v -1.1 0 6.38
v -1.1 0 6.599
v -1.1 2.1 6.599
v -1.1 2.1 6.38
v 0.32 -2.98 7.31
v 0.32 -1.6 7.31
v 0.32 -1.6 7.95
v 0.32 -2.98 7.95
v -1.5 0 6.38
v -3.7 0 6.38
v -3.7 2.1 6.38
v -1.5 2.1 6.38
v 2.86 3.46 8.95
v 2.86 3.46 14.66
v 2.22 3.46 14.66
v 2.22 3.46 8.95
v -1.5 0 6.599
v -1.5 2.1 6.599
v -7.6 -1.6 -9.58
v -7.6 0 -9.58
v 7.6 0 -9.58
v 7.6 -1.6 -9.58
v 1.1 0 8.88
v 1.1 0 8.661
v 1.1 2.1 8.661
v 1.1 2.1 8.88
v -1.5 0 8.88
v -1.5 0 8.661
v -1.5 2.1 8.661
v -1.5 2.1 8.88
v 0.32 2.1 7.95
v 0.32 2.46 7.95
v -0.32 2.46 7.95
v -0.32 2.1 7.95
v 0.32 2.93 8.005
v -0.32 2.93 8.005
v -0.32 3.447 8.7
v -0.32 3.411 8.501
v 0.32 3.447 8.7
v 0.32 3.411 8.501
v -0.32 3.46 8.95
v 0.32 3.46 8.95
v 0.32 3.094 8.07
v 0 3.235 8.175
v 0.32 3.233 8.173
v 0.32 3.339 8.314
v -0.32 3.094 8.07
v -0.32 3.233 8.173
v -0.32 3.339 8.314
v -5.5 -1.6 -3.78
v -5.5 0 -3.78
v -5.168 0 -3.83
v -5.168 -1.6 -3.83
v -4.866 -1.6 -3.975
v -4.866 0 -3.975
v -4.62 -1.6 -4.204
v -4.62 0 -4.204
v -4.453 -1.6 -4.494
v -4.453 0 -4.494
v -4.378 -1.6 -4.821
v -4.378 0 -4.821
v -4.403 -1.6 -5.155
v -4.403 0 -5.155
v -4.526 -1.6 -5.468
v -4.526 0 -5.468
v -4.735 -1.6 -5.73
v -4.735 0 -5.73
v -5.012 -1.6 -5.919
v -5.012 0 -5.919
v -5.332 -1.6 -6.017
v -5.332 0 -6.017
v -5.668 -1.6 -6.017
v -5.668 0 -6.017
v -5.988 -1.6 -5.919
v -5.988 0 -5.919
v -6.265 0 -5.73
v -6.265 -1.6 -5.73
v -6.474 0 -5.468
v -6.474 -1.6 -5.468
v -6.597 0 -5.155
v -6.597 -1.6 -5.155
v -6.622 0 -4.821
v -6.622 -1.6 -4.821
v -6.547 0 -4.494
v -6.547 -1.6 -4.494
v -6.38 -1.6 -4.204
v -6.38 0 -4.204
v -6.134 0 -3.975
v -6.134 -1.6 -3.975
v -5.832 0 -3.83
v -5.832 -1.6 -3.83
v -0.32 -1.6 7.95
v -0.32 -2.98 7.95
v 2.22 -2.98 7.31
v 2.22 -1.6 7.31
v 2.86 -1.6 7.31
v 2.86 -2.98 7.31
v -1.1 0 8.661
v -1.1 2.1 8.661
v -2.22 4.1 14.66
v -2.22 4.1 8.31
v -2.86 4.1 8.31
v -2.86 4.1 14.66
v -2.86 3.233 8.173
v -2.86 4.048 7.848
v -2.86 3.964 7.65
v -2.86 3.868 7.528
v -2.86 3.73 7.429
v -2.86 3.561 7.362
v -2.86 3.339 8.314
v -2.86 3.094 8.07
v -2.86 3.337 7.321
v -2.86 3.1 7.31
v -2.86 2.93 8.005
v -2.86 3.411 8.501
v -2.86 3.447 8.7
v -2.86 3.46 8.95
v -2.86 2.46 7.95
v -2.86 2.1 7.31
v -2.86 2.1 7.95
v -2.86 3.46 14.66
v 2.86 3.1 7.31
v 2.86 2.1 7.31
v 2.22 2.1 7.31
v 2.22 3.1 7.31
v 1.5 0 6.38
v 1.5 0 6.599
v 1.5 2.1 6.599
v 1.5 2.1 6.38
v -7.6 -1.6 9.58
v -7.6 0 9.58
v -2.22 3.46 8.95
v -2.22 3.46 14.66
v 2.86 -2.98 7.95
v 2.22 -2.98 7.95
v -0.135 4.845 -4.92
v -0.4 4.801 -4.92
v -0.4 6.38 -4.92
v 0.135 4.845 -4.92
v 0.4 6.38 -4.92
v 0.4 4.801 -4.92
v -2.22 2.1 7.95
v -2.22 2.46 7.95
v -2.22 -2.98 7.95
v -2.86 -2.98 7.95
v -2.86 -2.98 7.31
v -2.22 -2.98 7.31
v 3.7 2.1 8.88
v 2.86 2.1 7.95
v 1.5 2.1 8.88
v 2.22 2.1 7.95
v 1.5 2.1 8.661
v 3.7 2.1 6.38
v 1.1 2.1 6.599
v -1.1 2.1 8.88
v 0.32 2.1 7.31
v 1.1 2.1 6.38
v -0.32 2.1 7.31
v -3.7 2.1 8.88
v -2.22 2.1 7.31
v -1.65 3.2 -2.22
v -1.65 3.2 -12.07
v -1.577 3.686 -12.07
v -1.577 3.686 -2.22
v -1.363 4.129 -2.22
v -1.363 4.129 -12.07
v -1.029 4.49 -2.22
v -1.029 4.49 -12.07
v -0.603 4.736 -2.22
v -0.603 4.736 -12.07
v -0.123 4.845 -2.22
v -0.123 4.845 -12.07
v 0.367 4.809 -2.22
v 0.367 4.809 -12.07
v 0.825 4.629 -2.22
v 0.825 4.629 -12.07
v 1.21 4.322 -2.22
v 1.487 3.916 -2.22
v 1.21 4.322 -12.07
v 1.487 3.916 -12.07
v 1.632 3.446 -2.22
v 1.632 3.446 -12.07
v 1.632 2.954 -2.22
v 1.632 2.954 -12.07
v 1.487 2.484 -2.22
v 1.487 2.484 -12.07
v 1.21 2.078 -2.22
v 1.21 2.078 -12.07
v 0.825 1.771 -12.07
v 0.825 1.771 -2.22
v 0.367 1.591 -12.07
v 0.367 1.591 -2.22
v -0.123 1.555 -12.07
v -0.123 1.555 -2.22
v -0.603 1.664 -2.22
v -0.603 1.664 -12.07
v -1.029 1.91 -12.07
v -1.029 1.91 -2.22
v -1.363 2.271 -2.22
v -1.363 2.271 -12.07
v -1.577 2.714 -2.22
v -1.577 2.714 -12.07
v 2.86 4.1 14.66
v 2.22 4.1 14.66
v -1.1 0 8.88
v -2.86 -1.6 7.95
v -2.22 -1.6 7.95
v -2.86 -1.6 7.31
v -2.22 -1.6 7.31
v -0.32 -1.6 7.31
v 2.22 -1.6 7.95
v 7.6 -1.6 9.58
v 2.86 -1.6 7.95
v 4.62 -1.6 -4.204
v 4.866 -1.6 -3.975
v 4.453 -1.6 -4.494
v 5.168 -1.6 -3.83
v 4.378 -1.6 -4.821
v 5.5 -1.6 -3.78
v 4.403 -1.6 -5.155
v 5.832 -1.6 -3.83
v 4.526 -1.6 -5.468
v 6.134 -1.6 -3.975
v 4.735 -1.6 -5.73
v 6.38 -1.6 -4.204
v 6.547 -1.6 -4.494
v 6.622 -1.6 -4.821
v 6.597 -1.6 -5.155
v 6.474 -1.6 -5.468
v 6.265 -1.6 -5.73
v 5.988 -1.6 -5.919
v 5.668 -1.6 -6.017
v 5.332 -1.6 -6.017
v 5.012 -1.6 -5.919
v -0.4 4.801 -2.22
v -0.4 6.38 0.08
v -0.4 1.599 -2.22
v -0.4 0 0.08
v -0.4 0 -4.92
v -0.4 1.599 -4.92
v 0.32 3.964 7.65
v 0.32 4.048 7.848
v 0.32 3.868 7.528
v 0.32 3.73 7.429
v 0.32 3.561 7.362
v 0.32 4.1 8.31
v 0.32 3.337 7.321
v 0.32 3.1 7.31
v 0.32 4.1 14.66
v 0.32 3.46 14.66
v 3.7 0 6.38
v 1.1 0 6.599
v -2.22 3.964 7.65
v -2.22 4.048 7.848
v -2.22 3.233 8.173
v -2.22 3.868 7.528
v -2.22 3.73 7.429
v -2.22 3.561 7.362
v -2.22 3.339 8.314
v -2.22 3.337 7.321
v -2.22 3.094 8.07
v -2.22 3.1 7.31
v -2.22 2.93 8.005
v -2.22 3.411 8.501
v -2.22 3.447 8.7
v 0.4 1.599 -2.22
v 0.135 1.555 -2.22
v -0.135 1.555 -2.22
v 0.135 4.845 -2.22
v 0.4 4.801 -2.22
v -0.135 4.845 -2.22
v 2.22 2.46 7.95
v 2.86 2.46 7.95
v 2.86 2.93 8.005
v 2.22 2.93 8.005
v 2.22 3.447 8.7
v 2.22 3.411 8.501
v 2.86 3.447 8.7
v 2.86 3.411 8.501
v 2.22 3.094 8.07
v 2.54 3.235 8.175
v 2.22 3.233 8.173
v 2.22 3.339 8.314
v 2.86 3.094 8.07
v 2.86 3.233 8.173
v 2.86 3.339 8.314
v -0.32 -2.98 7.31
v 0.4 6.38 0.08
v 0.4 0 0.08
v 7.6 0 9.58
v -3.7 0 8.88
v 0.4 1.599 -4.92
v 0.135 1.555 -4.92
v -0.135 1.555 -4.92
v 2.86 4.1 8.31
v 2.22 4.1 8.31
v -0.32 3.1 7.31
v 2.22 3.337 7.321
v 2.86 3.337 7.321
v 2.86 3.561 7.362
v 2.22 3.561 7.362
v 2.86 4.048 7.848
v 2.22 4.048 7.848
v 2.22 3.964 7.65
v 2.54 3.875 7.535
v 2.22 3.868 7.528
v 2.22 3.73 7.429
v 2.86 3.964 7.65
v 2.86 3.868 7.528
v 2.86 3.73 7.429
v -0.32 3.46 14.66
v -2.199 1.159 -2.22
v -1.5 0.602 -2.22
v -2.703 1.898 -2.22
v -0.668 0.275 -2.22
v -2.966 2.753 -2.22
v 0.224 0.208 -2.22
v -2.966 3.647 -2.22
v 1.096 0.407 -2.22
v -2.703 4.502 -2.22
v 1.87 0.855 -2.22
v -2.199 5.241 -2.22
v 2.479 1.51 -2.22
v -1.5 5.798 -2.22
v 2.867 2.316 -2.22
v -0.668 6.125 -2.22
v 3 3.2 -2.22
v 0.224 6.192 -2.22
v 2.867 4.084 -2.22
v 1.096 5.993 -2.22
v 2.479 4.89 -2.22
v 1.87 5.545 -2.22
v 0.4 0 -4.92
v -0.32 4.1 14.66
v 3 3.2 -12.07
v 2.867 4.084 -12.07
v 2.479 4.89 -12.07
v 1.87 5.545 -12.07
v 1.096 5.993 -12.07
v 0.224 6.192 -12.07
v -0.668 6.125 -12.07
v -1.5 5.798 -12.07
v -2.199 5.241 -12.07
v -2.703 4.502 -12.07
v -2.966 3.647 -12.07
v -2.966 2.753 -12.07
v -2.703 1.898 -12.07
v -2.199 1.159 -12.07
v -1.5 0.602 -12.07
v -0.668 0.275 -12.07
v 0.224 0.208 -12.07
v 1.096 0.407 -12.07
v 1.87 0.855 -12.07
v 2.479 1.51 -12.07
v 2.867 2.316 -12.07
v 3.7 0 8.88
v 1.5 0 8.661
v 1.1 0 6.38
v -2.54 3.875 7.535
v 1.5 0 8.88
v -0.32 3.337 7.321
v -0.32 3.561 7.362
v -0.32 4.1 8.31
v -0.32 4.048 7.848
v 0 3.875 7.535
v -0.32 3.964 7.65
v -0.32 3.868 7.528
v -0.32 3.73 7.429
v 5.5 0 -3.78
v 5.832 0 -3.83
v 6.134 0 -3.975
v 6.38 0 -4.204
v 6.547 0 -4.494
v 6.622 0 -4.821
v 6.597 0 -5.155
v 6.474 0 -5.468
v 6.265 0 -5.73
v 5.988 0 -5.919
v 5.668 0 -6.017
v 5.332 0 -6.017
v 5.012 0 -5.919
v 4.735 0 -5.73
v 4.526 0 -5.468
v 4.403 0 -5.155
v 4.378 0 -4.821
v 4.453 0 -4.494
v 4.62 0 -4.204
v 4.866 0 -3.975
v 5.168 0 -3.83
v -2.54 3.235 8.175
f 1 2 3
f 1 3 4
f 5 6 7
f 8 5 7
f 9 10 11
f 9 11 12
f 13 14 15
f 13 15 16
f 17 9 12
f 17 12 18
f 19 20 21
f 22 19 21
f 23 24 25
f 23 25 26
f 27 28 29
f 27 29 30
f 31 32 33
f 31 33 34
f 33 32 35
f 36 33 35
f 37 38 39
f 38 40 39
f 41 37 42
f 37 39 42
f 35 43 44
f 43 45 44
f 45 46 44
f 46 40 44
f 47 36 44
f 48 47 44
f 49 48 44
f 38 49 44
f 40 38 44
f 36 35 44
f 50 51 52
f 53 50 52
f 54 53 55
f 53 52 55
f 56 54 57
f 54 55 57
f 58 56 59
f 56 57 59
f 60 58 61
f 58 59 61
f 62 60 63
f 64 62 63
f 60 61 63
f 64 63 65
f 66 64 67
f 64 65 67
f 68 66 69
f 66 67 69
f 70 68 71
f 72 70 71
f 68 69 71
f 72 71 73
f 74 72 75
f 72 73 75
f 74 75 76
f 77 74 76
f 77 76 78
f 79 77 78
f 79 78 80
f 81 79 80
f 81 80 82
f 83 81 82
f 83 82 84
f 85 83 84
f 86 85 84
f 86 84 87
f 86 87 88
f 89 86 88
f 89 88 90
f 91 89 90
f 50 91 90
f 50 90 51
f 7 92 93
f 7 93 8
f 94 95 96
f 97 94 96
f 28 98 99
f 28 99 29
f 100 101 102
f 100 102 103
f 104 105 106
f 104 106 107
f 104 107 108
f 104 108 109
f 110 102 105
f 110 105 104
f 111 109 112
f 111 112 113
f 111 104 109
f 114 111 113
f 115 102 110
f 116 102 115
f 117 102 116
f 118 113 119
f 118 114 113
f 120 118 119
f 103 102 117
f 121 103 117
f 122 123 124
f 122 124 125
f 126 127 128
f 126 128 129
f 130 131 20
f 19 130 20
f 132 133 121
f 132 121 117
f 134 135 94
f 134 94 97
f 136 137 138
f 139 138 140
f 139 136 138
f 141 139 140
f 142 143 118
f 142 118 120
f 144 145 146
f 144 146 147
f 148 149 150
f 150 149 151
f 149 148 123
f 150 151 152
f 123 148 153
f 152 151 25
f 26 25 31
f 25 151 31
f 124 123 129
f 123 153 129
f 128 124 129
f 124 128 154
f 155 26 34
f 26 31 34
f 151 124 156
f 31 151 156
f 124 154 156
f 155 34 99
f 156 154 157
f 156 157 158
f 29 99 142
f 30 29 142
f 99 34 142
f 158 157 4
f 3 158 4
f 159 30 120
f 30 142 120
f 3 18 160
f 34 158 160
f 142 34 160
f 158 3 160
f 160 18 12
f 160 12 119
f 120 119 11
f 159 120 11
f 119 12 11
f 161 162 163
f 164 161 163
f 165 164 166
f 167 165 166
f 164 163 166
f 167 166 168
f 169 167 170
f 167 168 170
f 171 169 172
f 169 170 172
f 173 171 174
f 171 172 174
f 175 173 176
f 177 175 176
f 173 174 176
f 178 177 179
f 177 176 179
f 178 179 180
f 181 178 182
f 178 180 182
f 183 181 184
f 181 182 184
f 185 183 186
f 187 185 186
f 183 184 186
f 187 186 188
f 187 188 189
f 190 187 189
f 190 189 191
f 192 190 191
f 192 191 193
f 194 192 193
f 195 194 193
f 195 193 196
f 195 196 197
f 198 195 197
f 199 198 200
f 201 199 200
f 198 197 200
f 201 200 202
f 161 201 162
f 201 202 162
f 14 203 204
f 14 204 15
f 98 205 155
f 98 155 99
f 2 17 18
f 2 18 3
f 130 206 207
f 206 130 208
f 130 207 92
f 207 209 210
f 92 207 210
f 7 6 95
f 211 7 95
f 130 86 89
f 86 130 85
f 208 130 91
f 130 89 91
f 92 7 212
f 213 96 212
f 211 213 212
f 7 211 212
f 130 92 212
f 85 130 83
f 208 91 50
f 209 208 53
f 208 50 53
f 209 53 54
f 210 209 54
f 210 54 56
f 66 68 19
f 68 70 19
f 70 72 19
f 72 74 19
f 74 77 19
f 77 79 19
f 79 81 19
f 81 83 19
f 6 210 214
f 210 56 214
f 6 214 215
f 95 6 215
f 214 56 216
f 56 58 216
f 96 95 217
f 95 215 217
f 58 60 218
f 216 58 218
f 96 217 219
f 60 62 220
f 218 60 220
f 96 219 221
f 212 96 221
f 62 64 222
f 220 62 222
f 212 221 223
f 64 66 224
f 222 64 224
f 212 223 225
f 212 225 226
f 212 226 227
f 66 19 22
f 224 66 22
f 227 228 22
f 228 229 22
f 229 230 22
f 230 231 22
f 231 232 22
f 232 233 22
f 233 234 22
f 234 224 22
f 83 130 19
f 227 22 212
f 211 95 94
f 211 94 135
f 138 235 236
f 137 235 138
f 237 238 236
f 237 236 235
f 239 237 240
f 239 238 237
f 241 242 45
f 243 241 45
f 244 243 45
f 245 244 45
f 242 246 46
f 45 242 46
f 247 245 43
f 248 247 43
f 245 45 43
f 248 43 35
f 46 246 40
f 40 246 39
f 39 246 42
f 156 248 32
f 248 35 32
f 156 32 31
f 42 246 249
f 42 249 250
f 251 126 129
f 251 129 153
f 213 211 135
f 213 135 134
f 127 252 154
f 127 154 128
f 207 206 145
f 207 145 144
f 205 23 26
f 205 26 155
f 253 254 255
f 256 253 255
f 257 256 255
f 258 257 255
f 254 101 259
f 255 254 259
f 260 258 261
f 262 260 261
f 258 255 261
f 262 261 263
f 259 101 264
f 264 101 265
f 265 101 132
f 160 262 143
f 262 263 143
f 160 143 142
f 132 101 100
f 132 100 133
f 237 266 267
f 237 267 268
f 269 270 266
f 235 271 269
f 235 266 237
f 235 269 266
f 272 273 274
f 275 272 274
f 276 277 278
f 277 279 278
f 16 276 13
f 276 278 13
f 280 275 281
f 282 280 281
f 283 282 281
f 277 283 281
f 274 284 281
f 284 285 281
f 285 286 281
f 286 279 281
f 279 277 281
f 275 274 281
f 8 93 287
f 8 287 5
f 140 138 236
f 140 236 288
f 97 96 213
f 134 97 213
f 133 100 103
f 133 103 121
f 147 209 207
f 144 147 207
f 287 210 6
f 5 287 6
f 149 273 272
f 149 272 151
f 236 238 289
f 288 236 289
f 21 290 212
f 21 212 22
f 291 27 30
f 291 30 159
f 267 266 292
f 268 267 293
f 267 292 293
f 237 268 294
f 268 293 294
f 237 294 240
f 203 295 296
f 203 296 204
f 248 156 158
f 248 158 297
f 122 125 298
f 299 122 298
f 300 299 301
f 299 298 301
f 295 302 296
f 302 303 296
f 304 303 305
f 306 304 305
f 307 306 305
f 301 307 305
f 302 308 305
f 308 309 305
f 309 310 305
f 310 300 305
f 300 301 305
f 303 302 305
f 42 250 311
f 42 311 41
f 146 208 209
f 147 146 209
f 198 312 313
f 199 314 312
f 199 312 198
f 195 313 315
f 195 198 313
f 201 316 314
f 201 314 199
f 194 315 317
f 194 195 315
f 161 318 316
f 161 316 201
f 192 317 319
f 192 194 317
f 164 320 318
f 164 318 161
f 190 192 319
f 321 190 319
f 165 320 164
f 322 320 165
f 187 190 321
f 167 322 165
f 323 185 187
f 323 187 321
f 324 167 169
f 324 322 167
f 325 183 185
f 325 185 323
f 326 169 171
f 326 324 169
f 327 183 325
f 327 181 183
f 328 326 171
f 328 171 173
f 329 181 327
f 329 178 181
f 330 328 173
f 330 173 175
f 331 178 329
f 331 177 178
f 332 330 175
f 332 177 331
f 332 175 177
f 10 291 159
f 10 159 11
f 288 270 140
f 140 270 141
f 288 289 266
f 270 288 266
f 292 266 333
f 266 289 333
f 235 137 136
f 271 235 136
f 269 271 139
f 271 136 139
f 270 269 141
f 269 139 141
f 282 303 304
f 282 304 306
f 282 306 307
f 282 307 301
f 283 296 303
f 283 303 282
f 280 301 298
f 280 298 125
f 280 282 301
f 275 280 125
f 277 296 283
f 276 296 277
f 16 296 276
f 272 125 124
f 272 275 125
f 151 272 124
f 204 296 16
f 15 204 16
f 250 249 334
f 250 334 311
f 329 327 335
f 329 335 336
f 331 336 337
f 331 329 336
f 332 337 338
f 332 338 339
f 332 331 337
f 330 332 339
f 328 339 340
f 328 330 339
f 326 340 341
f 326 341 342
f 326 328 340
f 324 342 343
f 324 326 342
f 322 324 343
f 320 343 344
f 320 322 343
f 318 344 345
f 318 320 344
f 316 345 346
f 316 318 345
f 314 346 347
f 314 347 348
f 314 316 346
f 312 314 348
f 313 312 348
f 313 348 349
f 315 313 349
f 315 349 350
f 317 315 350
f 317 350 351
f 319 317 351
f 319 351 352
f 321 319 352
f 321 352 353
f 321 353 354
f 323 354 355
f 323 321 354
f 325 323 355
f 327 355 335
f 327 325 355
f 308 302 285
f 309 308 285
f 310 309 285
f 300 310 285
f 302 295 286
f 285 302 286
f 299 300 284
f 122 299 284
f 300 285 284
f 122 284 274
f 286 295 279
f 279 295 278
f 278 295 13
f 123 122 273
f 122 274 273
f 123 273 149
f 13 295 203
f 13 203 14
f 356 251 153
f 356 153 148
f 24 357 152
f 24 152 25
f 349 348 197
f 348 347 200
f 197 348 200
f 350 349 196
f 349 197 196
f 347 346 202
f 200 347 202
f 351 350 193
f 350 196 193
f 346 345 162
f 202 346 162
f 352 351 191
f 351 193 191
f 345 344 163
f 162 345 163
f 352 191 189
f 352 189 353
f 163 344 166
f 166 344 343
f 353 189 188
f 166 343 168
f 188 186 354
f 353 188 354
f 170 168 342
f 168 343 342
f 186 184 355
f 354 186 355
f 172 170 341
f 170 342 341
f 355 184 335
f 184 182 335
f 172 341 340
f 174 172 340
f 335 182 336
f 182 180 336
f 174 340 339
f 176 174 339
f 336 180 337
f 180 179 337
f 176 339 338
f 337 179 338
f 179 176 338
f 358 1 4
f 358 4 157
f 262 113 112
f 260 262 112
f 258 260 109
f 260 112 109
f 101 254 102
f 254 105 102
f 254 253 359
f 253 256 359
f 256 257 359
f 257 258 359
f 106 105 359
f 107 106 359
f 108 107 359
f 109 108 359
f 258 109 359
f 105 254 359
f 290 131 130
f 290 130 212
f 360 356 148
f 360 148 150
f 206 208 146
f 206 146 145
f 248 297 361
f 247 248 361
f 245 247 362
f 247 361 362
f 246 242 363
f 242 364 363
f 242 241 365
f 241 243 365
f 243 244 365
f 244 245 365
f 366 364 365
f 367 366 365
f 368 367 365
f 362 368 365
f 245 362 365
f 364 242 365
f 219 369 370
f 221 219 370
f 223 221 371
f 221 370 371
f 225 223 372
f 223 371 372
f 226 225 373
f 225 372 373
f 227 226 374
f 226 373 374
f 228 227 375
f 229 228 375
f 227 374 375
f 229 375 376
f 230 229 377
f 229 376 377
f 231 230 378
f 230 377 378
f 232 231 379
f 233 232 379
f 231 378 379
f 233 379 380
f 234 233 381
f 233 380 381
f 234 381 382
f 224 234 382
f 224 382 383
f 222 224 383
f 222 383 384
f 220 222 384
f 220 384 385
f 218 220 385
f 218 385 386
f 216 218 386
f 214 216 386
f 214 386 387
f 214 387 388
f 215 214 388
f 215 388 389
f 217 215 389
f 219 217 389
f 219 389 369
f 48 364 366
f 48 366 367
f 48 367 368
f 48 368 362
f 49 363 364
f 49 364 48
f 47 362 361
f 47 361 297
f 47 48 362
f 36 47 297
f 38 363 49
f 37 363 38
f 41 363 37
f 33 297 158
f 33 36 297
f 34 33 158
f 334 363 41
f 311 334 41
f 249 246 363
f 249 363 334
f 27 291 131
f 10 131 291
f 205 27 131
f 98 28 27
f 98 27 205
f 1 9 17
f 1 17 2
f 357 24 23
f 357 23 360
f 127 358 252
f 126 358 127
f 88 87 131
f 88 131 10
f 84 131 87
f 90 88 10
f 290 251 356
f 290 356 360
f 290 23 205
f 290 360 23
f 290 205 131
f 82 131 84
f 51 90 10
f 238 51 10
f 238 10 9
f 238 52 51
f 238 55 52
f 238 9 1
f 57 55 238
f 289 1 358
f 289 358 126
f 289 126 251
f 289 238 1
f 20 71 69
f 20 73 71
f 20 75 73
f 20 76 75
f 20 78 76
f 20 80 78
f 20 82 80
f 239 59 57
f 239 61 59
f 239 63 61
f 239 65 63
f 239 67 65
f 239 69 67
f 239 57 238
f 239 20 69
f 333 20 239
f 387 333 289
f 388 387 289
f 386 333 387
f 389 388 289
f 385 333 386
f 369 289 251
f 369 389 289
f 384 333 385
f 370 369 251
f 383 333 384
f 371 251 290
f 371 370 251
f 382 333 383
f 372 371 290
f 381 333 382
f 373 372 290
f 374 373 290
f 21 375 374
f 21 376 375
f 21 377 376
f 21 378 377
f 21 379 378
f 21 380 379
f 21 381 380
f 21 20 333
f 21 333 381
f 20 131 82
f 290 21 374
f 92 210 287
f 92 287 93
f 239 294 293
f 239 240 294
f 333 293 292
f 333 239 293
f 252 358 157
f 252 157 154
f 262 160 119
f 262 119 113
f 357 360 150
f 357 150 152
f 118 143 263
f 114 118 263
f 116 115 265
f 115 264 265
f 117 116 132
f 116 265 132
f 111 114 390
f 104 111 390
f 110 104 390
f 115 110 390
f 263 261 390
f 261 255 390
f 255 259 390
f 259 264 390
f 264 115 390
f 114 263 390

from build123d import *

# Parameters (mm, degrees)
SKETCH1_W                     = 15.2
SKETCH1_H                     = 19.16
BOSS_EXTRUDE1_DEPTH           = 1.6
SKETCH2_R                     = 1.125
CUT_EXTRUDE1_DEPTH            = 13.332736923
BOSS_EXTRUDE2_DEPTH           = 2.1
BOSS_EXTRUDE3_DEPTH           = 0.32
FILLET1_SIZE                  = 1
LPATTERN1_COUNT               = 2
LPATTERN1_PITCH               = 2.54
FILLET1_OF_LPATTERN1_SIZE     = 1
LPATTERN1_COL_COUNT           = 2
LPATTERN1_COL_PITCH           = 2.54
FILLET1_OF_LPATTERN1_COL_SIZE = 1
SKETCH5_W                     = 0.8
SKETCH5_H                     = 5
BOSS_EXTRUDE4_DEPTH           = 6.38
SKETCH6_R                     = 3
BOSS_EXTRUDE7_DEPTH           = 9.85
SKETCH8_R                     = 1.65
CUT_EXTRUDE2_DEPTH            = 9.85
SKETCH9_W                     = 0.64
SKETCH9_H                     = 0.64
BOSS_EXTRUDE11_DEPTH          = 1.38


with BuildPart() as part:
    # Sketch1 → Boss-Extrude1 (new body)
    with BuildSketch(Plane(origin=(0, 0, 0), x_dir=(1, 0, 0), z_dir=(0, 1, 0))):
        Rectangle(SKETCH1_W, SKETCH1_H)
    extrude(amount=-BOSS_EXTRUDE1_DEPTH)

    # Sketch2 → Cut-Extrude1 (cut, through all)
    with BuildSketch(Plane(origin=(0, 0, 0), x_dir=(1, 0, 0), z_dir=(0, 1, 0))):
        with Locations(Location((-5.5, 4.905, 0), (0, 0, 270))):
            Circle(SKETCH2_R)
        with Locations(Location((5.5, 4.905, 0), (0, 0, 270))):
            Circle(SKETCH2_R)
    extrude(amount=-CUT_EXTRUDE1_DEPTH, mode=Mode.SUBTRACT)

    # Sketch3 → Boss-Extrude2 (add)
    with BuildSketch(Plane(origin=(0, 0, 0), x_dir=(1, 0, 0), z_dir=(0, 1, 0))):
        Polygon((-3.7, -6.38), (-1.5, -6.38), (-1.5, -6.598611303), (-1.1, -6.598611303), (-1.1, -6.38), (1.1, -6.38), (1.1, -6.598611303), (1.5, -6.598611303), (1.5, -6.38), (3.7, -6.38), (3.7, -8.88), (1.5, -8.88), (1.5, -8.661388697), (1.1, -8.661388697), (1.1, -8.88), (-1.1, -8.88), (-1.1, -8.661388697), (-1.5, -8.661388697), (-1.5, -8.88), (-3.7, -8.88), align=None)
    extrude(amount=BOSS_EXTRUDE2_DEPTH)

    # Sketch4 → Boss-Extrude3 (add, symmetric)
    with BuildSketch(Plane(origin=(0, 0, 0), x_dir=(0, 0, -1), z_dir=(1, 0, 0))):
        Polygon((-7.95, 2.1), (-7.31, 2.1), (-7.31, 4.1), (-14.66, 4.1), (-14.66, 3.46), (-7.95, 3.46), align=None)
    boss_extrude3 = extrude(amount=BOSS_EXTRUDE3_DEPTH, both=True)

    # Fillet1
    # a fillet whose section is not a circle: 1 mm, written as the material it adds along each edge
    with BuildSketch(Plane(origin=(0.32, 3.46, 7.95), x_dir=(0, -1, 0), z_dir=(-1, 0, 0))) as fillet1_piece_1:
        with BuildLine():
            Bezier((FILLET1_SIZE, 0), (0, 0), (0, FILLET1_SIZE), weights=[1, 1.222222222, 1])
            Line((0, FILLET1_SIZE), (0, 0))
            Line((0, 0), (FILLET1_SIZE, 0))
        make_face()
    extrude(amount=0.64)
    # a fillet whose section is not a circle: 1 mm, written as the material it takes off along each edge
    with BuildSketch(Plane(origin=(-2.82, 4.1, 7.31), x_dir=(0, -1, 0), z_dir=(1, 0, 0))) as fillet1_2_piece_1:
        with BuildLine():
            Bezier((FILLET1_SIZE, 0), (0, 0), (0, -FILLET1_SIZE), weights=[1, 1.222222222, 1])
            Line((0, -FILLET1_SIZE), (0, 0))
            Line((0, 0), (FILLET1_SIZE, 0))
        make_face()
    extrude(amount=5.64, mode=Mode.SUBTRACT)

    # LPattern1: Boss-Extrude3 ×2
    with Locations(*[(i * LPATTERN1_PITCH, 0, 0) for i in range(1, LPATTERN1_COUNT)]):
        add(boss_extrude3)

    # Fillet1 of LPattern1
    # a fillet whose section is not a circle: 1 mm, written as the material it adds along each edge
    with BuildSketch(Plane(origin=(2.86, 3.46, 7.95), x_dir=(0, -1, 0), z_dir=(-1, 0, 0))) as fillet1_of_lpattern1_piece_1:
        with BuildLine():
            Bezier((FILLET1_OF_LPATTERN1_SIZE, 0), (0, 0), (0, FILLET1_OF_LPATTERN1_SIZE), weights=[1, 1.222222222, 1])
            Line((0, FILLET1_OF_LPATTERN1_SIZE), (0, 0))
            Line((0, 0), (FILLET1_OF_LPATTERN1_SIZE, 0))
        make_face()
    extrude(amount=0.64)
    with BuildSketch(Plane(origin=(2.86, 3.46, 7.95), x_dir=(0, -1, 0), z_dir=(-1, 0, 0))) as fillet1_of_lpattern1_piece_2_section:
        with BuildLine():
            Bezier((FILLET1_OF_LPATTERN1_SIZE, 0), (0, 0), (0, FILLET1_OF_LPATTERN1_SIZE), weights=[1, 1.222222222, 1])
            Line((0, FILLET1_OF_LPATTERN1_SIZE), (0, 0))
            Line((0, 0), (FILLET1_OF_LPATTERN1_SIZE, 0))
        make_face()
    fillet1_of_lpattern1_piece_2 = extrude(amount=3.14, mode=Mode.PRIVATE)
    fillet1_of_lpattern1_piece_2 = split(fillet1_of_lpattern1_piece_2, bisect_by=Plane(origin=(0.32, 3.46, 7.95), z_dir=(-1, 0, 0)), keep=Keep.TOP, mode=Mode.PRIVATE)
    add(fillet1_of_lpattern1_piece_2)
    # a fillet whose section is not a circle: 1 mm, written as the material it takes off along each edge
    with BuildSketch(Plane(origin=(-0.28, 4.1, 7.31), x_dir=(0, -1, 0), z_dir=(1, 0, 0))) as fillet1_of_lpattern1_2_piece_1:
        with BuildLine():
            Bezier((FILLET1_OF_LPATTERN1_SIZE, 0), (0, 0), (0, -FILLET1_OF_LPATTERN1_SIZE), weights=[1, 1.222222222, 1])
            Line((0, -FILLET1_OF_LPATTERN1_SIZE), (0, 0))
            Line((0, 0), (FILLET1_OF_LPATTERN1_SIZE, 0))
        make_face()
    extrude(amount=5.64, mode=Mode.SUBTRACT)

    # LPattern1 col: Boss-Extrude3 ×2
    with Locations(*[(-i * LPATTERN1_COL_PITCH, 0, 0) for i in range(1, LPATTERN1_COL_COUNT)]):
        add(boss_extrude3)

    # Fillet1 of LPattern1 col
    # a fillet whose section is not a circle: 1 mm, written as the material it adds along each edge
    with BuildSketch(Plane(origin=(0.28, 3.46, 7.95), x_dir=(0, -1, 0), z_dir=(-1, 0, 0))) as fillet1_of_lpattern1_col_piece_1_section:
        with BuildLine():
            Bezier((FILLET1_OF_LPATTERN1_COL_SIZE, 0), (0, 0), (0, FILLET1_OF_LPATTERN1_COL_SIZE), weights=[1, 1.222222222, 1])
            Line((0, FILLET1_OF_LPATTERN1_COL_SIZE), (0, 0))
            Line((0, 0), (FILLET1_OF_LPATTERN1_COL_SIZE, 0))
        make_face()
    fillet1_of_lpattern1_col_piece_1 = extrude(amount=3.14, mode=Mode.PRIVATE)
    fillet1_of_lpattern1_col_piece_1 = split(fillet1_of_lpattern1_col_piece_1, bisect_by=Plane(origin=(-0.32, 3.46, 7.95), z_dir=(1, 0, 0)), keep=Keep.TOP, mode=Mode.PRIVATE)
    add(fillet1_of_lpattern1_col_piece_1)
    with BuildSketch(Plane(origin=(-2.22, 3.46, 7.95), x_dir=(0, -1, 0), z_dir=(-1, 0, 0))) as fillet1_of_lpattern1_col_piece_2:
        with BuildLine():
            Bezier((FILLET1_OF_LPATTERN1_COL_SIZE, 0), (0, 0), (0, FILLET1_OF_LPATTERN1_COL_SIZE), weights=[1, 1.222222222, 1])
            Line((0, FILLET1_OF_LPATTERN1_COL_SIZE), (0, 0))
            Line((0, 0), (FILLET1_OF_LPATTERN1_COL_SIZE, 0))
        make_face()
    extrude(amount=0.64)
    # a fillet whose section is not a circle: 1 mm, written as the material it takes off along each edge
    with BuildSketch(Plane(origin=(-5.36, 4.1, 7.31), x_dir=(0, -1, 0), z_dir=(1, 0, 0))) as fillet1_of_lpattern1_col_2_piece_1:
        with BuildLine():
            Bezier((FILLET1_OF_LPATTERN1_COL_SIZE, 0), (0, 0), (0, -FILLET1_OF_LPATTERN1_COL_SIZE), weights=[1, 1.222222222, 1])
            Line((0, -FILLET1_OF_LPATTERN1_COL_SIZE), (0, 0))
            Line((0, 0), (FILLET1_OF_LPATTERN1_COL_SIZE, 0))
        make_face()
    extrude(amount=5.64, mode=Mode.SUBTRACT)

    # Sketch5 → Boss-Extrude4 (add)
    with BuildSketch(Plane(origin=(0, 0, 0), x_dir=(1, 0, 0), z_dir=(0, 1, 0))):
        with Locations((0, 2.42)):
            Rectangle(SKETCH5_W, SKETCH5_H)
    extrude(amount=BOSS_EXTRUDE4_DEPTH)


with BuildPart() as body_2:
    # Sketch6 → Boss-Extrude7 (new body)
    with BuildSketch(Plane.XY.offset(-2.22)):
        with Locations((0, 3.2)):
            Circle(SKETCH6_R)
    extrude(amount=-BOSS_EXTRUDE7_DEPTH)


with BuildPart() as cut_extrude2_tool:
    # Sketch8 → Cut-Extrude2 (new body)
    with BuildSketch(Plane(origin=(0, 0, -12.07), x_dir=(-1, 0, 0), z_dir=(0, 0, -1))):
        with Locations((0, 3.2)):
            Circle(SKETCH8_R)
    extrude(amount=-CUT_EXTRUDE2_DEPTH)


with BuildPart() as part_1:
    add(part.part)

    # Cut-Extrude2: cut by cut_extrude2_tool
    add(cut_extrude2_tool.part, mode=Mode.SUBTRACT)

    # Sketch9 → Boss-Extrude11 (add)
    with BuildSketch(Plane.XZ.offset(1.6)):
        with Locations((2.54, 7.63)):
            Rectangle(SKETCH9_W, SKETCH9_H)
        with Locations((0, 7.63)):
            Rectangle(SKETCH9_W, SKETCH9_H)
        with Locations((-2.54, 7.63)):
            Rectangle(SKETCH9_W, SKETCH9_H)
    extrude(amount=BOSS_EXTRUDE11_DEPTH)


with BuildPart() as body_2_1:
    add(body_2.part)

    # Cut-Extrude2: cut by cut_extrude2_tool
    add(cut_extrude2_tool.part, mode=Mode.SUBTRACT)


solid = Compound([part_1.part, body_2_1.part])
